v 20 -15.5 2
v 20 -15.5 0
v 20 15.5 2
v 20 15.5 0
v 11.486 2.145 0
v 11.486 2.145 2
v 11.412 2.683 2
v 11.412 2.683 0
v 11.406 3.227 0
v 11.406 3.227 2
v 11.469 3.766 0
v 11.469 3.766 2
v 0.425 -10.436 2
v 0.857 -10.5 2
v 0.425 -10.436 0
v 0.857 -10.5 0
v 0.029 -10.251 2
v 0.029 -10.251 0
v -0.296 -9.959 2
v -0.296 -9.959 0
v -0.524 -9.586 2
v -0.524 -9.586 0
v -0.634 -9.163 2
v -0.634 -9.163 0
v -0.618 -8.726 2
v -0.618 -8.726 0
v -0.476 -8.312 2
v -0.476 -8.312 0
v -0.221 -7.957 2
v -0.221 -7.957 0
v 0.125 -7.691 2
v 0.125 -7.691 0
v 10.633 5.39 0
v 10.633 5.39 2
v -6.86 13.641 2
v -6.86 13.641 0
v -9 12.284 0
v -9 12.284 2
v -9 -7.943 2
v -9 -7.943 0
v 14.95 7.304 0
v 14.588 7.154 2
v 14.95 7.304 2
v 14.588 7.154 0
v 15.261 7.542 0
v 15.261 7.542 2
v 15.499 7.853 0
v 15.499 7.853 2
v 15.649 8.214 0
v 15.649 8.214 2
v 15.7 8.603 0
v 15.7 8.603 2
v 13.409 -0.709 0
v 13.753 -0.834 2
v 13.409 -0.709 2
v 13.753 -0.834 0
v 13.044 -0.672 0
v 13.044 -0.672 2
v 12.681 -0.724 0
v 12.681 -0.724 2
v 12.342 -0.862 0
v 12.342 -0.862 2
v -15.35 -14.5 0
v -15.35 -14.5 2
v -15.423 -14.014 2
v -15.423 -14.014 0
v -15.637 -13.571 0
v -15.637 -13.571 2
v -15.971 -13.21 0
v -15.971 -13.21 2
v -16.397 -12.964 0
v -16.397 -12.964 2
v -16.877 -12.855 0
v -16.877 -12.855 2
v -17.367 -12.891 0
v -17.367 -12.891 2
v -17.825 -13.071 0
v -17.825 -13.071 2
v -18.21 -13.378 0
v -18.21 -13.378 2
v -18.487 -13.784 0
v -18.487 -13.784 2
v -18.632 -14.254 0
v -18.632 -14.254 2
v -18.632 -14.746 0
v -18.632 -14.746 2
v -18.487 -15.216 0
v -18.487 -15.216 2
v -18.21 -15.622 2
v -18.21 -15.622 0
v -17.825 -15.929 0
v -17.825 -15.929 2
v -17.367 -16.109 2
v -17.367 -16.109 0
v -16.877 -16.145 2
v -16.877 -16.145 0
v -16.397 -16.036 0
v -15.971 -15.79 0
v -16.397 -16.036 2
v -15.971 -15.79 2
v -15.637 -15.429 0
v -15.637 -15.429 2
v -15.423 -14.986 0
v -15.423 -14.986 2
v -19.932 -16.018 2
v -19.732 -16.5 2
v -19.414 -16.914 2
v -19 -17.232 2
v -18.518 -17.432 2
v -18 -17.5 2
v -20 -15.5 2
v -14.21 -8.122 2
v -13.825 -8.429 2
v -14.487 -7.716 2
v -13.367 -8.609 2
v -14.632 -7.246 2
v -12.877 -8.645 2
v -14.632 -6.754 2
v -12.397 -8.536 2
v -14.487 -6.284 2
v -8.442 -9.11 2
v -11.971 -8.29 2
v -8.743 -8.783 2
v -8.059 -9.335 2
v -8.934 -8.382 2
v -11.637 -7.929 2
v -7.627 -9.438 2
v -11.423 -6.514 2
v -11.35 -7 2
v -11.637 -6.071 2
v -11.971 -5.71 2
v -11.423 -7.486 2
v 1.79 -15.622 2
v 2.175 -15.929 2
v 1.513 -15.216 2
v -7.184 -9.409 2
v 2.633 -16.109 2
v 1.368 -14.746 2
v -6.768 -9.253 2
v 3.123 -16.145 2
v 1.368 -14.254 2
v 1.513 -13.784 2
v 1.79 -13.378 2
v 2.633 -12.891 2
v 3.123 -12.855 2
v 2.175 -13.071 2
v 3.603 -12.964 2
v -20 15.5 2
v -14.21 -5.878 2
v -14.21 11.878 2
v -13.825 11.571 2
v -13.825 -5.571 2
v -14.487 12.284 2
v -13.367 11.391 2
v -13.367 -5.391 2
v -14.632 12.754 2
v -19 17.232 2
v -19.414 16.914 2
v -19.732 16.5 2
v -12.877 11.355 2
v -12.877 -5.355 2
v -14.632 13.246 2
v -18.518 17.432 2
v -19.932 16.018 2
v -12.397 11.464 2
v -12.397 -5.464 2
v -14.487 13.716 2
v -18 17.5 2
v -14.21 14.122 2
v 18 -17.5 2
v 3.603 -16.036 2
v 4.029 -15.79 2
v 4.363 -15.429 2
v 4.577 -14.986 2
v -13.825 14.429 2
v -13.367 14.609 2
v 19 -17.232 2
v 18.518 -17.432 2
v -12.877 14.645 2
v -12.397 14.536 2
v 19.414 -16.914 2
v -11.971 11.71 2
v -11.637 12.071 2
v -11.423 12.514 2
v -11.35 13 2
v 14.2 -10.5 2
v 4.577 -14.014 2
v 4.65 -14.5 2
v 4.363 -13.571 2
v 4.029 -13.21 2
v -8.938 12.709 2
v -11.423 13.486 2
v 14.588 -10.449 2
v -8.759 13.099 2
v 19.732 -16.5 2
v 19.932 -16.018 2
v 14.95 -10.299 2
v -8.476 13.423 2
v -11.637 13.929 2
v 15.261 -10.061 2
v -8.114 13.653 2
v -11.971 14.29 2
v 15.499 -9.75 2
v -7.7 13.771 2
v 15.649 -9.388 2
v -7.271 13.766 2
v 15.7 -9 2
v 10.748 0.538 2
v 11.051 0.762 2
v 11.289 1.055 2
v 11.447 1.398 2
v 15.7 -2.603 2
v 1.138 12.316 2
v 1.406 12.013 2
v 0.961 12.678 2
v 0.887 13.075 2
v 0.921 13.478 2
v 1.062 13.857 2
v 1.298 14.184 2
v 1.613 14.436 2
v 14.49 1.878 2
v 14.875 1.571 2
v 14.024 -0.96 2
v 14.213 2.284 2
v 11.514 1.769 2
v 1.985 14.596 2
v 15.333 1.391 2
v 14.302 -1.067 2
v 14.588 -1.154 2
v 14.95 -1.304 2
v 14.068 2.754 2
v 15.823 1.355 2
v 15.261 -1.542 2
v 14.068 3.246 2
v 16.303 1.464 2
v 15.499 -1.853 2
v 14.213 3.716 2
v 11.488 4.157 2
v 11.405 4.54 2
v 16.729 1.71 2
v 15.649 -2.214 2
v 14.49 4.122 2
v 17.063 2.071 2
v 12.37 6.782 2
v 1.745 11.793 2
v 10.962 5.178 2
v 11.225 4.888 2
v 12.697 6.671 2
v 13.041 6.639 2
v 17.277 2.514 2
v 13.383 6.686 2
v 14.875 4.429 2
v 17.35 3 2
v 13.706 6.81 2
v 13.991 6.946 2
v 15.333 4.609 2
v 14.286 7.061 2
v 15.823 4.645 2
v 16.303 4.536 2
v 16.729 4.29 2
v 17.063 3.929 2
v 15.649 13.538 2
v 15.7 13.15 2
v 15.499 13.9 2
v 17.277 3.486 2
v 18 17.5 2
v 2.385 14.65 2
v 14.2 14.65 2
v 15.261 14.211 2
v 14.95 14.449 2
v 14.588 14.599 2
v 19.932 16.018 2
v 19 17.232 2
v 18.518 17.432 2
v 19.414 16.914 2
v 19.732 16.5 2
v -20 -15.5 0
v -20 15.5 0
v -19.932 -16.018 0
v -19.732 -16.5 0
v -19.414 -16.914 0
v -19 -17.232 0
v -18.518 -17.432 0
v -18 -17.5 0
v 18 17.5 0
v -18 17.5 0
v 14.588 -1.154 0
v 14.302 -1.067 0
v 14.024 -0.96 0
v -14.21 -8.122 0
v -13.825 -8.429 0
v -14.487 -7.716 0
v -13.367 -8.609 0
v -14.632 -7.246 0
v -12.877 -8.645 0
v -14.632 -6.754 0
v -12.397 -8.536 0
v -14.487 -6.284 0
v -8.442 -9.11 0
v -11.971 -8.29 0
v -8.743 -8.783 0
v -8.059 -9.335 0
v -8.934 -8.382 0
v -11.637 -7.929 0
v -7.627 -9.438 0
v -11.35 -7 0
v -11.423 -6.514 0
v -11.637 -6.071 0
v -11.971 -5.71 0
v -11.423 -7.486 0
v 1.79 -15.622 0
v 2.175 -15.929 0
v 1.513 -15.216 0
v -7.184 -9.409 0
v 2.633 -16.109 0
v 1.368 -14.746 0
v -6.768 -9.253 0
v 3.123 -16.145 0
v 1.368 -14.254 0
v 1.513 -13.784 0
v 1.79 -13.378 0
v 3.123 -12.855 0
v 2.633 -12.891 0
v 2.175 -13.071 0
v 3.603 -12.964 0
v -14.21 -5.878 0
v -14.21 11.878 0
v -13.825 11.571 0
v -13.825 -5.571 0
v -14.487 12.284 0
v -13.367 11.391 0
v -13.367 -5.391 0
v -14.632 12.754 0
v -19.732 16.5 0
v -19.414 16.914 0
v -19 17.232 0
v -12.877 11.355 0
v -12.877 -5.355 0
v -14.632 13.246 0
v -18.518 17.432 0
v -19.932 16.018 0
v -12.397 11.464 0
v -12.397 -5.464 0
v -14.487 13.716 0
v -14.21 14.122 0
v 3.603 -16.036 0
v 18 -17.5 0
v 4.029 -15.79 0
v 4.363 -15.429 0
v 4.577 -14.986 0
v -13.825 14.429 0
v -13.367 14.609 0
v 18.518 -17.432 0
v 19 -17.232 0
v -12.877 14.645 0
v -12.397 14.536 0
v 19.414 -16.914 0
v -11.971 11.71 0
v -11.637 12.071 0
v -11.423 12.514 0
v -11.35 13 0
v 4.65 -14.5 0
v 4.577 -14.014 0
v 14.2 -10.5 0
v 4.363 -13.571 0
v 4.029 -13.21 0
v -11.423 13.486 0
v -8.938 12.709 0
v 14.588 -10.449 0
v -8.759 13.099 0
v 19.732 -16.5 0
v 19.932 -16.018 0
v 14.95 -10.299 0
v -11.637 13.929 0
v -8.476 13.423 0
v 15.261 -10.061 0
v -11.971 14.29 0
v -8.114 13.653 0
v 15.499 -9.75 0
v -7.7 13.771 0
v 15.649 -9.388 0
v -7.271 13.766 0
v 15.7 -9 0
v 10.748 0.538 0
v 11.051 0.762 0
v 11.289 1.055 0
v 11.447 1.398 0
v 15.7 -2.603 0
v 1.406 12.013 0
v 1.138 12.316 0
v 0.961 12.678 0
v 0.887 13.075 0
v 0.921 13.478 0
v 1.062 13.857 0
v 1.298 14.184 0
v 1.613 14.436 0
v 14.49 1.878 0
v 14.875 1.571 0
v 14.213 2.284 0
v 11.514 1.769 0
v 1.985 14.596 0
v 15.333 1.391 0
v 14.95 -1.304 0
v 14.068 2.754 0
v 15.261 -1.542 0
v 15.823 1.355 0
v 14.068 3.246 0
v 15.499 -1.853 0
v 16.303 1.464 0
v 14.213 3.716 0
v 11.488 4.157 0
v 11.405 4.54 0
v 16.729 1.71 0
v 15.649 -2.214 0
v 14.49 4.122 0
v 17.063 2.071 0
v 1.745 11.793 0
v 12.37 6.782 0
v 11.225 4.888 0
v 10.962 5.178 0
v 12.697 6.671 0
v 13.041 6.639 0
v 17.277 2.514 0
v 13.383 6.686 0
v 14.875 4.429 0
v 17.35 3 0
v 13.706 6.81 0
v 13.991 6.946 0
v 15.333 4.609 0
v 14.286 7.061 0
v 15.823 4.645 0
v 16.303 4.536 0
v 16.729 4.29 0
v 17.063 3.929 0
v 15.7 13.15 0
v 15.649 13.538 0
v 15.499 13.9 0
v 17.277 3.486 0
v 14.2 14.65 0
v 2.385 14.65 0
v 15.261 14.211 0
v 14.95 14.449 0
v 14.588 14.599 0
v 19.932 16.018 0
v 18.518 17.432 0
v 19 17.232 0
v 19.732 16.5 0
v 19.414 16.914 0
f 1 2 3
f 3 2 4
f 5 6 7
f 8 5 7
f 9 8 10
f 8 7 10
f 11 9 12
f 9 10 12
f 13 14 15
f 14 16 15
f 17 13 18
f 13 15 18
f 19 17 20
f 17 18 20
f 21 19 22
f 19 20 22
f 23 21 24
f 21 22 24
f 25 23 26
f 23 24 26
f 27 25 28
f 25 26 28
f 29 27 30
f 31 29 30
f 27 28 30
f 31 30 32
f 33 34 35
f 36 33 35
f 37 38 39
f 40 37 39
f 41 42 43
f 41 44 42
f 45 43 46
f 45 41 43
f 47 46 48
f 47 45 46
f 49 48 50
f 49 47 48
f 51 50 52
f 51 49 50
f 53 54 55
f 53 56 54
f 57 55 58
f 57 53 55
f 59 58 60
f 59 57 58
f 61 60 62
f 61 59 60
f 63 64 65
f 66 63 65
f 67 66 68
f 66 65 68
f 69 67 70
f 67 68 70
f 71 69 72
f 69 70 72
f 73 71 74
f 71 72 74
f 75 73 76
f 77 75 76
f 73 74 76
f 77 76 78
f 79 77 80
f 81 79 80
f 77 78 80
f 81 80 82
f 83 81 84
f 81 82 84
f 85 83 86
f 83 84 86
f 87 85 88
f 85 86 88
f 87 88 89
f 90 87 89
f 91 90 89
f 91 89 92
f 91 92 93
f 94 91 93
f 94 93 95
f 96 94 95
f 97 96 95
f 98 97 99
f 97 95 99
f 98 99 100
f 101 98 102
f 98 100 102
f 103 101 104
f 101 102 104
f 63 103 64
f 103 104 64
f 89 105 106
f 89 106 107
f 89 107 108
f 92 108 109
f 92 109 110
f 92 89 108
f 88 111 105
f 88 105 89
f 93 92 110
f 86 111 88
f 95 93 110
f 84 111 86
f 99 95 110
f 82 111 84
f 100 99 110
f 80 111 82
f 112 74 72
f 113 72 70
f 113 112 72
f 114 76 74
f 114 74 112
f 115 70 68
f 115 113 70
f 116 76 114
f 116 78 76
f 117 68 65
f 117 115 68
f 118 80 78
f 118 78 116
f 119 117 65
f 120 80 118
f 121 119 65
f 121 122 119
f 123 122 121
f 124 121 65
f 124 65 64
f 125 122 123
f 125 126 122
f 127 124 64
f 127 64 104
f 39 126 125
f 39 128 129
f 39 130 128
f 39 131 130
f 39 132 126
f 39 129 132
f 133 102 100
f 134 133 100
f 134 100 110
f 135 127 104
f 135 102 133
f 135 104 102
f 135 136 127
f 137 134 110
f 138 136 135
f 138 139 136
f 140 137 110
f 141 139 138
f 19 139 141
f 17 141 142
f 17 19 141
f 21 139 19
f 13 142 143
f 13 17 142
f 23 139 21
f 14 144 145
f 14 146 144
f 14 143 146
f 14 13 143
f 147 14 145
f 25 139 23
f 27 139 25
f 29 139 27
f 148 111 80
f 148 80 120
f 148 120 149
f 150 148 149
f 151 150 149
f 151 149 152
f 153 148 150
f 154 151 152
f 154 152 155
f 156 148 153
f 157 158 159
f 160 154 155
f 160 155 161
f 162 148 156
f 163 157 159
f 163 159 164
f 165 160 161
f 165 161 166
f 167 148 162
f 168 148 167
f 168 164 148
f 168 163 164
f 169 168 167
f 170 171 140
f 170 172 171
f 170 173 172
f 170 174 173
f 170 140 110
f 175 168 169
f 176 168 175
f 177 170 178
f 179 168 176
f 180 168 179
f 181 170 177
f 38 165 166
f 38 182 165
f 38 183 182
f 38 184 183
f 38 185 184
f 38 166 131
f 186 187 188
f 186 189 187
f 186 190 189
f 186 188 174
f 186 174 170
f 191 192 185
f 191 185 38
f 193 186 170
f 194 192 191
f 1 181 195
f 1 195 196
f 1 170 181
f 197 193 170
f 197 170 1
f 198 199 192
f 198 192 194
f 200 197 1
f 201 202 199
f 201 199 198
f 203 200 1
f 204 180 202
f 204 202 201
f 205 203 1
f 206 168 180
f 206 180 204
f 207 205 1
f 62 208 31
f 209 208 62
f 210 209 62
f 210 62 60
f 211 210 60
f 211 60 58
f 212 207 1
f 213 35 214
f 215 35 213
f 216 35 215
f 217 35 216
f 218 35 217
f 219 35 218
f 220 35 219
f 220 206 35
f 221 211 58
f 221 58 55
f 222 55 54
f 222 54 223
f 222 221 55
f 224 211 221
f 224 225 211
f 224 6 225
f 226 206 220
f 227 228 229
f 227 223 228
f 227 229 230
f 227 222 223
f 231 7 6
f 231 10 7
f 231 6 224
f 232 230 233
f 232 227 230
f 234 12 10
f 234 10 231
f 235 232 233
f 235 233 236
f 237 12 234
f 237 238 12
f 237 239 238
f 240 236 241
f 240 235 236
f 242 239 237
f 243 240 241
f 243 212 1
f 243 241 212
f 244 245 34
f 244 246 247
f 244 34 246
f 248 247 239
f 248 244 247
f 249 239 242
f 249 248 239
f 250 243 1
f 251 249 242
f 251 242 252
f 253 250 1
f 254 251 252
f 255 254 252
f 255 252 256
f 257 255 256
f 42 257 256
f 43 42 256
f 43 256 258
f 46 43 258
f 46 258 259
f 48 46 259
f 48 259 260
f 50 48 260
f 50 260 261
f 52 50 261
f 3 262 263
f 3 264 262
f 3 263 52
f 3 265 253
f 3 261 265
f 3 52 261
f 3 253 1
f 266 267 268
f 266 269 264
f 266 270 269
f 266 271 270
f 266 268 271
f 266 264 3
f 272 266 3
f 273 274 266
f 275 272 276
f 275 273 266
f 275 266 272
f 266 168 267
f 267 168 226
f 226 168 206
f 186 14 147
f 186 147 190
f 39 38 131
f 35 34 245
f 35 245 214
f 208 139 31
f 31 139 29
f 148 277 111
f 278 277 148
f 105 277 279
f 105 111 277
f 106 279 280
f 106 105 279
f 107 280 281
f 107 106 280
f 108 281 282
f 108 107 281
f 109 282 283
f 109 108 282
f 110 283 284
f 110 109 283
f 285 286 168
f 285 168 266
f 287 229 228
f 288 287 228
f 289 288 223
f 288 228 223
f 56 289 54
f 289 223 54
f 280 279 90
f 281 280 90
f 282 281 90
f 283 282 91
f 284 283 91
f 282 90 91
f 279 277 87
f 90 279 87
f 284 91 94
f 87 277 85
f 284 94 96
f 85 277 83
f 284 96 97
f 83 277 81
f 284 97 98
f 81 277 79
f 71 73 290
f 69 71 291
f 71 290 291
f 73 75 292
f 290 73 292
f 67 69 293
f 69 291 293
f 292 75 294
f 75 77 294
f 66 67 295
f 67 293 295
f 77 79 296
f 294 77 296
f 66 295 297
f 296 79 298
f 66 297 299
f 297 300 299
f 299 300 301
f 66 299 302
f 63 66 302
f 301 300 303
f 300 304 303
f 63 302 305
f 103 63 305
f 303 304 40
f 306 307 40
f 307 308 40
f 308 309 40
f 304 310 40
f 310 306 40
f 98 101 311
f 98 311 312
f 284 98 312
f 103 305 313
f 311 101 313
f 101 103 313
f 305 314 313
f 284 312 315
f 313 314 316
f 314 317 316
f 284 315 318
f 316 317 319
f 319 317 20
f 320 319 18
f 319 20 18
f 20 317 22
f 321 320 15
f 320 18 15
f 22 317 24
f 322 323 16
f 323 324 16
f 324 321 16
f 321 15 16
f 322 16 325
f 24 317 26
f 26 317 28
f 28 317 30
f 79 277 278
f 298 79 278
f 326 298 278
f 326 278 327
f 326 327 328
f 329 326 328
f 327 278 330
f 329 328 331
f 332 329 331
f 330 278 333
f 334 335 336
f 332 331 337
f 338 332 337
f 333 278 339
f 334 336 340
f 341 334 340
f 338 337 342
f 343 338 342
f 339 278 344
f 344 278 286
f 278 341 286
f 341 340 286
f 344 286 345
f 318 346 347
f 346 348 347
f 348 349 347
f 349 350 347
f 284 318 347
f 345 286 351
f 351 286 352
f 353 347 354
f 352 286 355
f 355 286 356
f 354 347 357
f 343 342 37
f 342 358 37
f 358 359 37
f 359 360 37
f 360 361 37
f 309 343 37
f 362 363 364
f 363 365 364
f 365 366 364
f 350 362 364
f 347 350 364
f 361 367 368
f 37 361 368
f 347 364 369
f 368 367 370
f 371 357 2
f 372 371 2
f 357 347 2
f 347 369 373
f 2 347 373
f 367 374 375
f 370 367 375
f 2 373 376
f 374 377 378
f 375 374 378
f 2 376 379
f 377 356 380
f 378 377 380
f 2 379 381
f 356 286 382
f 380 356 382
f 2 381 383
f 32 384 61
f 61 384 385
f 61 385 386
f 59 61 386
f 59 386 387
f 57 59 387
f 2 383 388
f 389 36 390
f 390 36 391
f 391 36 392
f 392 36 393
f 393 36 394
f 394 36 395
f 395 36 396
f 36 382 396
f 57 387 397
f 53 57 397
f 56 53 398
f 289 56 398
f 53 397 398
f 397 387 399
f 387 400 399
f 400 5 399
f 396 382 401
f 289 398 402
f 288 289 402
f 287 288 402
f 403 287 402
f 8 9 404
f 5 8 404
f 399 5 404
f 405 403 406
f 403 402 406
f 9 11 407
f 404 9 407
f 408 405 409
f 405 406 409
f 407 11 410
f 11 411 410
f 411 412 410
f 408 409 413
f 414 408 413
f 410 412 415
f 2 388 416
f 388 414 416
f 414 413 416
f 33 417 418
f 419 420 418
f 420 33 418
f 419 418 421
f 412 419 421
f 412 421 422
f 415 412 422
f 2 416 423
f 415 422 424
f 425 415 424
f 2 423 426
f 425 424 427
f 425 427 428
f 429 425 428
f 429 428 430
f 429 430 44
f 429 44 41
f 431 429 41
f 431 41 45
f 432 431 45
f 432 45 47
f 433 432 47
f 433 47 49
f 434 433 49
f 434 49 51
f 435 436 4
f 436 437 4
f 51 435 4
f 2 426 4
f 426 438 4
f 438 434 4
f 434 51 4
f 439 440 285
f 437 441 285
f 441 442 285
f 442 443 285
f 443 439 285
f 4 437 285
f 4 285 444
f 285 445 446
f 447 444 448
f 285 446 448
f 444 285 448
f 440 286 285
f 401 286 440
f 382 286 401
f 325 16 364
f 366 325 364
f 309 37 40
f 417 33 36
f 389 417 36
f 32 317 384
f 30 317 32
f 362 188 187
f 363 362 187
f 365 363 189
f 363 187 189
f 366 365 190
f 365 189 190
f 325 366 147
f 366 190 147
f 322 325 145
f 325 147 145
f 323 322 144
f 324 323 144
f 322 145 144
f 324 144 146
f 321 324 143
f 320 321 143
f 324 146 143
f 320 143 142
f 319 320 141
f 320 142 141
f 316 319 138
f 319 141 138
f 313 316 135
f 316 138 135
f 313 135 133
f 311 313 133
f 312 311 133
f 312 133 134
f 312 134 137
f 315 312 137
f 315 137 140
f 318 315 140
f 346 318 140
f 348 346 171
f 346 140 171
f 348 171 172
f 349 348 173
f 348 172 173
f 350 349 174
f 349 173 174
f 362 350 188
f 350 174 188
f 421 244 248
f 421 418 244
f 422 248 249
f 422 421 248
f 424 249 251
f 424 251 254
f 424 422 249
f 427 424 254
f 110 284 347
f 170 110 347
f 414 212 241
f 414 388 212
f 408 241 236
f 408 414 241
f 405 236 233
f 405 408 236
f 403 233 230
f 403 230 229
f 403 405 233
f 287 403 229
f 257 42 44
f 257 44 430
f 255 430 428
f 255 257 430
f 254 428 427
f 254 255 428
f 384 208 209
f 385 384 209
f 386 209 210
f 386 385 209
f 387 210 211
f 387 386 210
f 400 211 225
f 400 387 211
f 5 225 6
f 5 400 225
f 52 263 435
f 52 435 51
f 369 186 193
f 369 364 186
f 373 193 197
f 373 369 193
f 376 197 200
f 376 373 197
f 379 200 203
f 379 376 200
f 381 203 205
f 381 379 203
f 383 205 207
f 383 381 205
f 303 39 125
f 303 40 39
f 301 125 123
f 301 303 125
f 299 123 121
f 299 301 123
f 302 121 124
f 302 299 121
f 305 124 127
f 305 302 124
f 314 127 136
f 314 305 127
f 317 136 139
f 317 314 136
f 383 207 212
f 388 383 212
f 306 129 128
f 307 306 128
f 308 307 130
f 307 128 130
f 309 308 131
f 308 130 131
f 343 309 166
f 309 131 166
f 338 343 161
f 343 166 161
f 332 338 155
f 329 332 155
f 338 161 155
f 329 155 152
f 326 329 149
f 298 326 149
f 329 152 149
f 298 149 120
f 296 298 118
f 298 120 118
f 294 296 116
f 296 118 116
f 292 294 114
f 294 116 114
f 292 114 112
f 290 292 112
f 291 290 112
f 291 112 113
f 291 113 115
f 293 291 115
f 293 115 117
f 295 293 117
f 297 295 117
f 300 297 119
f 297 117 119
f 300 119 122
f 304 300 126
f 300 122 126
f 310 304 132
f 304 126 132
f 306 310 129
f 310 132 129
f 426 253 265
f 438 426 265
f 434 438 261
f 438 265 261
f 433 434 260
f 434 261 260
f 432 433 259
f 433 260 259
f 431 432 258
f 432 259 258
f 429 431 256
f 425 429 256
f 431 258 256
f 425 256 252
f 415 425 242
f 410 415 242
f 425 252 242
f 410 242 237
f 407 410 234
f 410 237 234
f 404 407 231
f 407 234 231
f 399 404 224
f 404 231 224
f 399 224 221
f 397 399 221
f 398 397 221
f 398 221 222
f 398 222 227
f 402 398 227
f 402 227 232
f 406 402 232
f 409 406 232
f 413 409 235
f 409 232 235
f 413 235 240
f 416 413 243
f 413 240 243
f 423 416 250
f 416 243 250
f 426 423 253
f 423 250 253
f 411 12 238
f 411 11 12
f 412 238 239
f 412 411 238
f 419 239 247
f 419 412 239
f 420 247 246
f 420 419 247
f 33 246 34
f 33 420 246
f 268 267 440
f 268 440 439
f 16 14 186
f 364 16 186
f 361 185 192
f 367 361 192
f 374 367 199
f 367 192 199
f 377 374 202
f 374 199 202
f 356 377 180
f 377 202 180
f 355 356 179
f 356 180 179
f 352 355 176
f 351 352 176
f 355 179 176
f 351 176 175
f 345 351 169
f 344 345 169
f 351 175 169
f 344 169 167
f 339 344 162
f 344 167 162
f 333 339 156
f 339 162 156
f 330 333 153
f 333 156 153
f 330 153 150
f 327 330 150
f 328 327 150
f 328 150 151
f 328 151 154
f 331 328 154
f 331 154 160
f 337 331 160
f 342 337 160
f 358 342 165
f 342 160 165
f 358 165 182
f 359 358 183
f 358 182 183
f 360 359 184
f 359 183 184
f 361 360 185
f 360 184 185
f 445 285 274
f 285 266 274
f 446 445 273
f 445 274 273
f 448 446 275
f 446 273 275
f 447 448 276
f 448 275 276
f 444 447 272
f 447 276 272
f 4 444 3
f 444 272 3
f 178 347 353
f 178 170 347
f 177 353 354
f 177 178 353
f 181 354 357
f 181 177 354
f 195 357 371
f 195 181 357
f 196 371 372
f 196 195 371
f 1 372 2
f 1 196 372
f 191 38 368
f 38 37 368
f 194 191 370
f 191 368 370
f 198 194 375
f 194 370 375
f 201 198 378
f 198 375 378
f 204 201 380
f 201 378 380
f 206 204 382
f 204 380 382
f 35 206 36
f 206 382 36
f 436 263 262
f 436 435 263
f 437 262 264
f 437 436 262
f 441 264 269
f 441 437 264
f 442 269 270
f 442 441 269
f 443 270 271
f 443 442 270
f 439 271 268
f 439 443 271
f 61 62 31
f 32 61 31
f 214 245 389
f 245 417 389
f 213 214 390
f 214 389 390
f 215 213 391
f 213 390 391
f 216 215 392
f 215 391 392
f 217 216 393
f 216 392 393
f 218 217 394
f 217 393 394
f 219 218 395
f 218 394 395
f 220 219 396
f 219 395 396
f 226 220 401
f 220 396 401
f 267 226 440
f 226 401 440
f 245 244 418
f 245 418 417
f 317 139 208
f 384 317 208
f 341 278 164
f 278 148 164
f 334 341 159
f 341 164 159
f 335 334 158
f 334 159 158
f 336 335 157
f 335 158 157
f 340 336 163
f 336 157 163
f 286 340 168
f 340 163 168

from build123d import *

# Parameters (mm, degrees)
SKETCH_1_W          = 40
SKETCH_1_H          = 35
EXTRUDE_1_DEPTH     = 2
SKETCH_2_R          = 1.65
CUT_EXTRUDE_1_DEPTH = 2
FILLET_1_R          = 2
CUT_EXTRUDE_2_DEPTH = 10
FILLET_2_R          = 1.5


with BuildPart() as part:
    # 草图1 → 凸台-拉伸1 (new body)
    with BuildSketch(Plane.XY):
        Rectangle(SKETCH_1_W, SKETCH_1_H)
    extrude(amount=EXTRUDE_1_DEPTH)

    # 草图2 → 切除-拉伸1 (cut)
    with BuildSketch(Plane.XY.offset(2)):
        with Locations((-17, -14.5)):
            Circle(SKETCH_2_R)
        with Locations((3, -14.5)):
            Circle(SKETCH_2_R)
        with Locations((-13, -7)):
            Circle(SKETCH_2_R)
        with Locations((-13, 13)):
            Circle(SKETCH_2_R)
        with Locations((15.7, 3)):
            Circle(SKETCH_2_R)
    extrude(amount=-CUT_EXTRUDE_1_DEPTH, mode=Mode.SUBTRACT)

    # 圆角1
    fillet_1_edges = [part.edges().sort_by_distance(p)[0] for p in [
        (20, -17.5, 1),
        (-20, -17.5, 1),
        (-20, 17.5, 1),
        (20, 17.5, 1),
    ]]
    fillet(fillet_1_edges, radius=FILLET_1_R)

    # 草图3 → 切除-拉伸2 (cut)
    with BuildSketch(Plane.XY.offset(2)):
        with BuildLine():
            Line((-9, 14.65), (-9, -10.5))
            Line((-9, -10.5), (11.823480969, 1.139193668))
            ThreePointArc((11.823480969, 1.139193668), (11.400024975, 2.985344434), (11.81088684, 4.834338798))
            Line((11.81088684, 4.834338798), (-9, 14.65))
        make_face()
        with BuildLine():
            Line((-4.900820963, -10.5), (15.7, -10.5))
            Line((15.7, -10.5), (15.7, -1.3))
            ThreePointArc((15.7, -1.3), (14.334491183, -1.077423901), (13.110344983, -0.432737522))
            Line((13.110344983, -0.432737522), (-4.900820963, -10.5))
        make_face()
        with BuildLine():
            Line((-4.31166216, 14.65), (15.7, 14.65))
            Line((15.7, 14.65), (15.7, 7.3))
            ThreePointArc((15.7, 7.3), (14.334491183, 7.077423901), (13.110344983, 6.432737522))
            Line((13.110344983, 6.432737522), (-4.31166216, 14.65))
        make_face()
    extrude(amount=-CUT_EXTRUDE_2_DEPTH, mode=Mode.SUBTRACT)

    # 圆角2
    fillet_2_edges = [part.edges().sort_by_distance(p)[0] for p in [
        (-4.900820963, -10.5, 1),
        (13.110344983, -0.432737522, 1),
        (15.7, -1.3, 1),
        (15.7, -10.5, 1),
        (13.110344983, 6.432737522, 1),
        (-4.31166216, 14.65, 1),
        (15.7, 14.65, 1),
        (15.7, 7.3, 1),
        (-9, 14.65, 1),
        (11.81088684, 4.834338798, 1),
        (11.823480969, 1.139193668, 1),
        (-9, -10.5, 1),
    ]]
    fillet(fillet_2_edges, radius=FILLET_2_R)


solid = part.part
